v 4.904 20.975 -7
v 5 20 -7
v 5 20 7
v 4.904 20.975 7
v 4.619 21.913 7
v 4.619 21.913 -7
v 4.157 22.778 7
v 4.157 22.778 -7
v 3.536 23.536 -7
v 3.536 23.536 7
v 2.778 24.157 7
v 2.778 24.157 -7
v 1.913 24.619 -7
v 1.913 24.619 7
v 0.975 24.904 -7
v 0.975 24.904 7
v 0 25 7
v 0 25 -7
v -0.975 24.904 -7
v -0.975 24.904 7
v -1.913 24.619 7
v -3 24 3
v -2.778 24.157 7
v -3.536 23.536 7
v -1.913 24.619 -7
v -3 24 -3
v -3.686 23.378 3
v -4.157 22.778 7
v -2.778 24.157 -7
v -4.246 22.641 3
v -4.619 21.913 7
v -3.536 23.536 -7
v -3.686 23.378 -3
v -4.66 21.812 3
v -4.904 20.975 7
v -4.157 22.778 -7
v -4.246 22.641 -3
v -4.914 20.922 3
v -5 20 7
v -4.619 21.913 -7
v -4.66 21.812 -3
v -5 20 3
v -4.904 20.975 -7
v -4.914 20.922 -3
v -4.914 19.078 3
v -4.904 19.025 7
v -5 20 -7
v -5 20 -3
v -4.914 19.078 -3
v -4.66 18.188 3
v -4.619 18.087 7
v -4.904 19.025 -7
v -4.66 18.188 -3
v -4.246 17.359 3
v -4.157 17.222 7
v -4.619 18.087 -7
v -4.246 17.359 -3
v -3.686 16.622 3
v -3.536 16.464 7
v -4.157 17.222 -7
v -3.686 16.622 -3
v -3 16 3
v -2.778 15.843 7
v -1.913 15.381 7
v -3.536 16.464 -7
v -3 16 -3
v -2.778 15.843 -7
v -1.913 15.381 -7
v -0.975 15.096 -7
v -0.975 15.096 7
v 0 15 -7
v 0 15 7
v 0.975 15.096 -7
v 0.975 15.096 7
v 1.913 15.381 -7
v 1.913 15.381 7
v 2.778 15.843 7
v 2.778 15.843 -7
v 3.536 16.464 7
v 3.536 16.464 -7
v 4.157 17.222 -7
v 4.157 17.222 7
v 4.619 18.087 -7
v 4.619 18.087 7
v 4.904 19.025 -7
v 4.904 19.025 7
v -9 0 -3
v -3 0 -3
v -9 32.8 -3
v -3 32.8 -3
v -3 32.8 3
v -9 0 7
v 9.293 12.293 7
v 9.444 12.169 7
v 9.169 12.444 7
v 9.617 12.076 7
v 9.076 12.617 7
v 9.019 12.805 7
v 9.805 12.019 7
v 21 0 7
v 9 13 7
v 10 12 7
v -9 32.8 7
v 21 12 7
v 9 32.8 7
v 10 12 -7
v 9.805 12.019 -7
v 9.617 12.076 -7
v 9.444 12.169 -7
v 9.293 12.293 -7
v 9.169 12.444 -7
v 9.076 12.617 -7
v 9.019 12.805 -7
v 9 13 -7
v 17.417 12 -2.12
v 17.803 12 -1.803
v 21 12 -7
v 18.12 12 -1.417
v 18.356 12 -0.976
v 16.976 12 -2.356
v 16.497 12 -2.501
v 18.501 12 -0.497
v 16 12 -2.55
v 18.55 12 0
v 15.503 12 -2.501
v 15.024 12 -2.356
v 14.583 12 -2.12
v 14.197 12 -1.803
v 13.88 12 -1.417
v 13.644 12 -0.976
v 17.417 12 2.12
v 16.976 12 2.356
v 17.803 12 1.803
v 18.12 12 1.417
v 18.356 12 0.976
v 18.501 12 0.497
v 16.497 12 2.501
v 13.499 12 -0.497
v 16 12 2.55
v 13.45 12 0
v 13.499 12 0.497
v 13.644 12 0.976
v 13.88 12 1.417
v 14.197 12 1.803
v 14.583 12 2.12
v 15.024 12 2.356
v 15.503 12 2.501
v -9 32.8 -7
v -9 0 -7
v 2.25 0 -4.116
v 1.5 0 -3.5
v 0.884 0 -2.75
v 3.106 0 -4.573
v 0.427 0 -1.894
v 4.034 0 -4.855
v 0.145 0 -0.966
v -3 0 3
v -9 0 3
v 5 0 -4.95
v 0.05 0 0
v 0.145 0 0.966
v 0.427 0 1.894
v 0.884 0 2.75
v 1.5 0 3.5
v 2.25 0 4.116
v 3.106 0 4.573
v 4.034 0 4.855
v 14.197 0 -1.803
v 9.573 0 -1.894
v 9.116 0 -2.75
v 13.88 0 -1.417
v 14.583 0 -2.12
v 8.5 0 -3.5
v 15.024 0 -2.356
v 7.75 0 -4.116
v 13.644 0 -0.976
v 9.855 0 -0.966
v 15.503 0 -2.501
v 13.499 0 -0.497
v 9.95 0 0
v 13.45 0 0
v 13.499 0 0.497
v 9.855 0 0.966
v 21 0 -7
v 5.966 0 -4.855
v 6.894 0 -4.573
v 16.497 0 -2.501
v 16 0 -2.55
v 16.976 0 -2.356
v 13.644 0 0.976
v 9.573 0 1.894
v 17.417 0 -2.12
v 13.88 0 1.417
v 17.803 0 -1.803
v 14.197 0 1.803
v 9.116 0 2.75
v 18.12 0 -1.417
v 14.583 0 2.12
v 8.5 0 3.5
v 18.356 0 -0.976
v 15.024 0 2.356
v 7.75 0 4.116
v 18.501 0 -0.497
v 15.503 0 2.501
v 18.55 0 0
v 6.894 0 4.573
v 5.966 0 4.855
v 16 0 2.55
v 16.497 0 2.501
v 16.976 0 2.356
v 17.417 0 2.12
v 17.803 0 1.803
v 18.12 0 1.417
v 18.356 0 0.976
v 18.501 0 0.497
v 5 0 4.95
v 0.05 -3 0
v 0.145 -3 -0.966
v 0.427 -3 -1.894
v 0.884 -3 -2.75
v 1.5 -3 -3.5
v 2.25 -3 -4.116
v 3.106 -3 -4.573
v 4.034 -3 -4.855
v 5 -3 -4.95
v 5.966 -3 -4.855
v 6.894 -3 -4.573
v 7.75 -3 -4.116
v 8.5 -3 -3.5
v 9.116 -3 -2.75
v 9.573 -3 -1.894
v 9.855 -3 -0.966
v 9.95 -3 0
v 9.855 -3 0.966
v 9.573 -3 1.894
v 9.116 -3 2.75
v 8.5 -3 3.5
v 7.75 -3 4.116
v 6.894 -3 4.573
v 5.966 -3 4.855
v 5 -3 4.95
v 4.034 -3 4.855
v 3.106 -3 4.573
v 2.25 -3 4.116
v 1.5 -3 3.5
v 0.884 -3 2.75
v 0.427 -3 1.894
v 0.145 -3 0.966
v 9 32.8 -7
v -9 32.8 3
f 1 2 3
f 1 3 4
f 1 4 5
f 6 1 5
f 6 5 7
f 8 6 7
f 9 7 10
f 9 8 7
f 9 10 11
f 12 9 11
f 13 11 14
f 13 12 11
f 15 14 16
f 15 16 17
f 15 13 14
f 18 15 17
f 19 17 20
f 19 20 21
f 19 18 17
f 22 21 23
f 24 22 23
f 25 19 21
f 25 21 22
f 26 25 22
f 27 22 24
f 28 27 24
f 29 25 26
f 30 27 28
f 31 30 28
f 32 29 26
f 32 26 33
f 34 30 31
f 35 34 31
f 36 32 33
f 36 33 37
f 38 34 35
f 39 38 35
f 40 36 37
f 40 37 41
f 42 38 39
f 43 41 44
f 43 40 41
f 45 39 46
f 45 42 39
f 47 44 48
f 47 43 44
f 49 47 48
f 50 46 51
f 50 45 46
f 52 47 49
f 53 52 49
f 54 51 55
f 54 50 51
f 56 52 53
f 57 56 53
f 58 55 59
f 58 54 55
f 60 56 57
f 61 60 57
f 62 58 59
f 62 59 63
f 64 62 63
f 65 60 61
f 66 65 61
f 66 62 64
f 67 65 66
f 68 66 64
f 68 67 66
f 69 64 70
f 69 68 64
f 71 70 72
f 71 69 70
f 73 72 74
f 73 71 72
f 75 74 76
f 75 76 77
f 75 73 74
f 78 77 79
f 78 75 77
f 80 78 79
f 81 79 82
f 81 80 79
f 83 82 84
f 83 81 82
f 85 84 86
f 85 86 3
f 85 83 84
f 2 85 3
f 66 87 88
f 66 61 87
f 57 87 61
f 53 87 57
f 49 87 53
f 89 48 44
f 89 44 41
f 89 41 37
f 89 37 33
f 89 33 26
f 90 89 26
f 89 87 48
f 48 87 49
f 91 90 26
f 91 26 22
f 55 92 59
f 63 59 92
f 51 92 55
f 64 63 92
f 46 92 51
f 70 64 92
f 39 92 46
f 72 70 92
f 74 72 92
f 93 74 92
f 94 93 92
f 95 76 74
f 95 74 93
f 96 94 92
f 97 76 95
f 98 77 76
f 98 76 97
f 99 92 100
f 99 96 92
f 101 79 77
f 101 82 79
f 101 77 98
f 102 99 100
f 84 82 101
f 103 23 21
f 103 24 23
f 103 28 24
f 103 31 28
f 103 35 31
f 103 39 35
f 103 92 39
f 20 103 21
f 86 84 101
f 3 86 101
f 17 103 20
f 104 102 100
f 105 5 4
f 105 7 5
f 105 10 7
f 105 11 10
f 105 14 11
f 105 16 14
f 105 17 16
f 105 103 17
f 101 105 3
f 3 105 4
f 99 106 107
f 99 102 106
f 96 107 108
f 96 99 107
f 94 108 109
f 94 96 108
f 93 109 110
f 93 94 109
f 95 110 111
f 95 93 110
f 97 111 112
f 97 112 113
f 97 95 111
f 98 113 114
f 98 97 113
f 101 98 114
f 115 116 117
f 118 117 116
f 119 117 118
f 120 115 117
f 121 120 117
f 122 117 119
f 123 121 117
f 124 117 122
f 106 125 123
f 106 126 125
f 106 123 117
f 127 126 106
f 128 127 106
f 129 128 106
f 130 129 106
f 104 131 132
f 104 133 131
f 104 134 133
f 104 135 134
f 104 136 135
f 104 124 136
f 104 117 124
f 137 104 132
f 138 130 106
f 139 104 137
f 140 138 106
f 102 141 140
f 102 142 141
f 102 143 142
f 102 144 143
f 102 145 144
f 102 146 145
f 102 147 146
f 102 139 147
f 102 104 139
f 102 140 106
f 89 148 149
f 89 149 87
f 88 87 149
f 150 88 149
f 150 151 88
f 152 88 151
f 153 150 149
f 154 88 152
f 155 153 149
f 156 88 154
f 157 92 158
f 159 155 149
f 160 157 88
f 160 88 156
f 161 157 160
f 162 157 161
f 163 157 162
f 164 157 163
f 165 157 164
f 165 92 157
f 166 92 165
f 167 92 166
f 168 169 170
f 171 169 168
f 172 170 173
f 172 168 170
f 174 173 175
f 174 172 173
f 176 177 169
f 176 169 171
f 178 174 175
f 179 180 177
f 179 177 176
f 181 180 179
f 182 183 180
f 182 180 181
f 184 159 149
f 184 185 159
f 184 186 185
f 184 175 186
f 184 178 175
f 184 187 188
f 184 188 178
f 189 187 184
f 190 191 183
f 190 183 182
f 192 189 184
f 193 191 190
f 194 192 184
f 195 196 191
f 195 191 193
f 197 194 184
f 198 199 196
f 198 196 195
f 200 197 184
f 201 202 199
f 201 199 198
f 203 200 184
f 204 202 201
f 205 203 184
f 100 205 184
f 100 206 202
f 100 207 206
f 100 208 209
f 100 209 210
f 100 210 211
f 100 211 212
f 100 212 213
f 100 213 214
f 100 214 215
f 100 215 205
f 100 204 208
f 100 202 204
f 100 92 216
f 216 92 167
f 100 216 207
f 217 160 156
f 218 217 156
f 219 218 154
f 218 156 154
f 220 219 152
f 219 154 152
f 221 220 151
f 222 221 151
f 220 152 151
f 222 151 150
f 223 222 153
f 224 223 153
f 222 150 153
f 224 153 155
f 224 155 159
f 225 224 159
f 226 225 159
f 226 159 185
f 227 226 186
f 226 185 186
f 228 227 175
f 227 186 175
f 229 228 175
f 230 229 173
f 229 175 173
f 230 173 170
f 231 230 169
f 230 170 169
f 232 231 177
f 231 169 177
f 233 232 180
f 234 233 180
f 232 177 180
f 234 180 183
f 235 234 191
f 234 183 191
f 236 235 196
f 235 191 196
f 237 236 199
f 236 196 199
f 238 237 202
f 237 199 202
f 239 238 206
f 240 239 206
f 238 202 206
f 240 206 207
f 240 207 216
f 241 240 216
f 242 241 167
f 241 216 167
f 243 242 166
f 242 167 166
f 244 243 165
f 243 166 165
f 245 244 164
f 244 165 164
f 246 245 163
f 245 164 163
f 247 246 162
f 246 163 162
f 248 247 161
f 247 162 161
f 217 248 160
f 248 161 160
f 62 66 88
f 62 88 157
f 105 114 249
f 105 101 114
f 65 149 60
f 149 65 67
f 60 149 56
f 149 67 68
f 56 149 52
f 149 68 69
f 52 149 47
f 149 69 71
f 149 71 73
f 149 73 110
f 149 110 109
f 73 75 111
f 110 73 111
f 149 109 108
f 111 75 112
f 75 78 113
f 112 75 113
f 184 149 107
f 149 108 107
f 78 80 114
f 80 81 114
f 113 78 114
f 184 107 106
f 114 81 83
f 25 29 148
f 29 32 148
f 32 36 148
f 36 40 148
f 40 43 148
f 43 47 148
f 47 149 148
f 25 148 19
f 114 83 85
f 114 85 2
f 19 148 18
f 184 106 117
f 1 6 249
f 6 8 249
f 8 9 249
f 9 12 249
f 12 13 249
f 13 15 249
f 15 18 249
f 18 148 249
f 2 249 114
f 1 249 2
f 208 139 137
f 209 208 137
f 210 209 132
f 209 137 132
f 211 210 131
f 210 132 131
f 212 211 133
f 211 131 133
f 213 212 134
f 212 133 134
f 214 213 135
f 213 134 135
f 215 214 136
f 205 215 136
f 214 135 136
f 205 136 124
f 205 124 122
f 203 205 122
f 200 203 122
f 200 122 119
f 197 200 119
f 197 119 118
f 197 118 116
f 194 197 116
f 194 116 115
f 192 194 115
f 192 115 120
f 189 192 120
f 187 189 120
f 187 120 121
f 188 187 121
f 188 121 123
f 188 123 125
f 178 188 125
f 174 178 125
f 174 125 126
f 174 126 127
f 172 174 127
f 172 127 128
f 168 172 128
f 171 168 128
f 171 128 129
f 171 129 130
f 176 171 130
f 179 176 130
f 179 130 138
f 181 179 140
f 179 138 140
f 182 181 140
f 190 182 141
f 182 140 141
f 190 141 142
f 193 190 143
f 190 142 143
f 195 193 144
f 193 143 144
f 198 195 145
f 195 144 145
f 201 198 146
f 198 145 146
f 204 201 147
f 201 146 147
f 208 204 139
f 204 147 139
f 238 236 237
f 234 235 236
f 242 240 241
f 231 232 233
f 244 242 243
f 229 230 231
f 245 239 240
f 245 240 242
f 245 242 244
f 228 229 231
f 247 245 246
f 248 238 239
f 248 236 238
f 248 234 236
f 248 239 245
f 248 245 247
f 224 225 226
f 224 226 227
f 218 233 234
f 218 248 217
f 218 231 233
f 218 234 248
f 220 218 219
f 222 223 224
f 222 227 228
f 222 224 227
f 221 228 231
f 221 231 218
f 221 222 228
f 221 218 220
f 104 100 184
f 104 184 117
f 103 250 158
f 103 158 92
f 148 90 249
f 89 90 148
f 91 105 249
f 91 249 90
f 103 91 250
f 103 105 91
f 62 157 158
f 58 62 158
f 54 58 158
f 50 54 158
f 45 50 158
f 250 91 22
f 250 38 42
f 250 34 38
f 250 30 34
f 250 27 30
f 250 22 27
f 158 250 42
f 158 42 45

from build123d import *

# Parameters (mm, degrees)
SKETCH_1_R          = 5
EXTRUDE_1_DEPTH     = 7
SKETCH_2_R          = 2.55
CUT_EXTRUDE_1_DEPTH = 31.374989712
CUT_EXTRUDE_2_DEPTH = 40.570696228
FILLET_2_R          = 1
SKETCH_5_R          = 4.95
EXTRUDE_2_DEPTH     = 3


with BuildPart() as part:
    # 草图1 → 凸台-拉伸1 (new, symmetric)
    with BuildSketch(Plane.XY):
        Polygon((-21, 0), (21, 0), (21, 12), (9, 12), (9, 32.8), (-9, 32.8), (-9, 12), (-21, 12), align=None)
        with Locations((0, 20)):
            Circle(SKETCH_1_R, mode=Mode.SUBTRACT)
    extrude(amount=EXTRUDE_1_DEPTH, both=True)

    # 草图2 → 切除-拉伸1 (cut, through all)
    with BuildSketch(Plane(origin=(0, 12, 0), x_dir=(1, 0, 0), z_dir=(0, 1, 0))):
        with Locations(Location((16, 0, 0), (0, 0, 270))):
            Circle(SKETCH_2_R)
        with Locations(Location((-16, 0, 0), (0, 0, 90))):
            Circle(SKETCH_2_R)
    extrude(amount=-CUT_EXTRUDE_1_DEPTH, mode=Mode.SUBTRACT)

    # 草图4 → 切除-拉伸2 (cut, through all)
    with BuildSketch(Plane(origin=(0, 32.8, 0), x_dir=(1, 0, 0), z_dir=(0, 1, 0))):
        Polygon((-9, 3), (-3, 3), (-3, -3), (-9, -3), (-9, -7), (-21, -7), (-21, 7), (-9, 7), align=None)
    extrude(amount=-CUT_EXTRUDE_2_DEPTH, mode=Mode.SUBTRACT)

    # 圆角2
    fillet_2_edges = [part.edges().sort_by_distance(p)[0] for p in [
        (9, 12, 0),
    ]]
    fillet(fillet_2_edges, radius=FILLET_2_R)

    # 草图5 → 凸台-拉伸2 (add)
    with BuildSketch(Plane.XZ):
        with Locations(Location((5, 0, 0), (0, 0, 180))):
            Circle(SKETCH_5_R)
    extrude(amount=EXTRUDE_2_DEPTH)


solid = part.part
